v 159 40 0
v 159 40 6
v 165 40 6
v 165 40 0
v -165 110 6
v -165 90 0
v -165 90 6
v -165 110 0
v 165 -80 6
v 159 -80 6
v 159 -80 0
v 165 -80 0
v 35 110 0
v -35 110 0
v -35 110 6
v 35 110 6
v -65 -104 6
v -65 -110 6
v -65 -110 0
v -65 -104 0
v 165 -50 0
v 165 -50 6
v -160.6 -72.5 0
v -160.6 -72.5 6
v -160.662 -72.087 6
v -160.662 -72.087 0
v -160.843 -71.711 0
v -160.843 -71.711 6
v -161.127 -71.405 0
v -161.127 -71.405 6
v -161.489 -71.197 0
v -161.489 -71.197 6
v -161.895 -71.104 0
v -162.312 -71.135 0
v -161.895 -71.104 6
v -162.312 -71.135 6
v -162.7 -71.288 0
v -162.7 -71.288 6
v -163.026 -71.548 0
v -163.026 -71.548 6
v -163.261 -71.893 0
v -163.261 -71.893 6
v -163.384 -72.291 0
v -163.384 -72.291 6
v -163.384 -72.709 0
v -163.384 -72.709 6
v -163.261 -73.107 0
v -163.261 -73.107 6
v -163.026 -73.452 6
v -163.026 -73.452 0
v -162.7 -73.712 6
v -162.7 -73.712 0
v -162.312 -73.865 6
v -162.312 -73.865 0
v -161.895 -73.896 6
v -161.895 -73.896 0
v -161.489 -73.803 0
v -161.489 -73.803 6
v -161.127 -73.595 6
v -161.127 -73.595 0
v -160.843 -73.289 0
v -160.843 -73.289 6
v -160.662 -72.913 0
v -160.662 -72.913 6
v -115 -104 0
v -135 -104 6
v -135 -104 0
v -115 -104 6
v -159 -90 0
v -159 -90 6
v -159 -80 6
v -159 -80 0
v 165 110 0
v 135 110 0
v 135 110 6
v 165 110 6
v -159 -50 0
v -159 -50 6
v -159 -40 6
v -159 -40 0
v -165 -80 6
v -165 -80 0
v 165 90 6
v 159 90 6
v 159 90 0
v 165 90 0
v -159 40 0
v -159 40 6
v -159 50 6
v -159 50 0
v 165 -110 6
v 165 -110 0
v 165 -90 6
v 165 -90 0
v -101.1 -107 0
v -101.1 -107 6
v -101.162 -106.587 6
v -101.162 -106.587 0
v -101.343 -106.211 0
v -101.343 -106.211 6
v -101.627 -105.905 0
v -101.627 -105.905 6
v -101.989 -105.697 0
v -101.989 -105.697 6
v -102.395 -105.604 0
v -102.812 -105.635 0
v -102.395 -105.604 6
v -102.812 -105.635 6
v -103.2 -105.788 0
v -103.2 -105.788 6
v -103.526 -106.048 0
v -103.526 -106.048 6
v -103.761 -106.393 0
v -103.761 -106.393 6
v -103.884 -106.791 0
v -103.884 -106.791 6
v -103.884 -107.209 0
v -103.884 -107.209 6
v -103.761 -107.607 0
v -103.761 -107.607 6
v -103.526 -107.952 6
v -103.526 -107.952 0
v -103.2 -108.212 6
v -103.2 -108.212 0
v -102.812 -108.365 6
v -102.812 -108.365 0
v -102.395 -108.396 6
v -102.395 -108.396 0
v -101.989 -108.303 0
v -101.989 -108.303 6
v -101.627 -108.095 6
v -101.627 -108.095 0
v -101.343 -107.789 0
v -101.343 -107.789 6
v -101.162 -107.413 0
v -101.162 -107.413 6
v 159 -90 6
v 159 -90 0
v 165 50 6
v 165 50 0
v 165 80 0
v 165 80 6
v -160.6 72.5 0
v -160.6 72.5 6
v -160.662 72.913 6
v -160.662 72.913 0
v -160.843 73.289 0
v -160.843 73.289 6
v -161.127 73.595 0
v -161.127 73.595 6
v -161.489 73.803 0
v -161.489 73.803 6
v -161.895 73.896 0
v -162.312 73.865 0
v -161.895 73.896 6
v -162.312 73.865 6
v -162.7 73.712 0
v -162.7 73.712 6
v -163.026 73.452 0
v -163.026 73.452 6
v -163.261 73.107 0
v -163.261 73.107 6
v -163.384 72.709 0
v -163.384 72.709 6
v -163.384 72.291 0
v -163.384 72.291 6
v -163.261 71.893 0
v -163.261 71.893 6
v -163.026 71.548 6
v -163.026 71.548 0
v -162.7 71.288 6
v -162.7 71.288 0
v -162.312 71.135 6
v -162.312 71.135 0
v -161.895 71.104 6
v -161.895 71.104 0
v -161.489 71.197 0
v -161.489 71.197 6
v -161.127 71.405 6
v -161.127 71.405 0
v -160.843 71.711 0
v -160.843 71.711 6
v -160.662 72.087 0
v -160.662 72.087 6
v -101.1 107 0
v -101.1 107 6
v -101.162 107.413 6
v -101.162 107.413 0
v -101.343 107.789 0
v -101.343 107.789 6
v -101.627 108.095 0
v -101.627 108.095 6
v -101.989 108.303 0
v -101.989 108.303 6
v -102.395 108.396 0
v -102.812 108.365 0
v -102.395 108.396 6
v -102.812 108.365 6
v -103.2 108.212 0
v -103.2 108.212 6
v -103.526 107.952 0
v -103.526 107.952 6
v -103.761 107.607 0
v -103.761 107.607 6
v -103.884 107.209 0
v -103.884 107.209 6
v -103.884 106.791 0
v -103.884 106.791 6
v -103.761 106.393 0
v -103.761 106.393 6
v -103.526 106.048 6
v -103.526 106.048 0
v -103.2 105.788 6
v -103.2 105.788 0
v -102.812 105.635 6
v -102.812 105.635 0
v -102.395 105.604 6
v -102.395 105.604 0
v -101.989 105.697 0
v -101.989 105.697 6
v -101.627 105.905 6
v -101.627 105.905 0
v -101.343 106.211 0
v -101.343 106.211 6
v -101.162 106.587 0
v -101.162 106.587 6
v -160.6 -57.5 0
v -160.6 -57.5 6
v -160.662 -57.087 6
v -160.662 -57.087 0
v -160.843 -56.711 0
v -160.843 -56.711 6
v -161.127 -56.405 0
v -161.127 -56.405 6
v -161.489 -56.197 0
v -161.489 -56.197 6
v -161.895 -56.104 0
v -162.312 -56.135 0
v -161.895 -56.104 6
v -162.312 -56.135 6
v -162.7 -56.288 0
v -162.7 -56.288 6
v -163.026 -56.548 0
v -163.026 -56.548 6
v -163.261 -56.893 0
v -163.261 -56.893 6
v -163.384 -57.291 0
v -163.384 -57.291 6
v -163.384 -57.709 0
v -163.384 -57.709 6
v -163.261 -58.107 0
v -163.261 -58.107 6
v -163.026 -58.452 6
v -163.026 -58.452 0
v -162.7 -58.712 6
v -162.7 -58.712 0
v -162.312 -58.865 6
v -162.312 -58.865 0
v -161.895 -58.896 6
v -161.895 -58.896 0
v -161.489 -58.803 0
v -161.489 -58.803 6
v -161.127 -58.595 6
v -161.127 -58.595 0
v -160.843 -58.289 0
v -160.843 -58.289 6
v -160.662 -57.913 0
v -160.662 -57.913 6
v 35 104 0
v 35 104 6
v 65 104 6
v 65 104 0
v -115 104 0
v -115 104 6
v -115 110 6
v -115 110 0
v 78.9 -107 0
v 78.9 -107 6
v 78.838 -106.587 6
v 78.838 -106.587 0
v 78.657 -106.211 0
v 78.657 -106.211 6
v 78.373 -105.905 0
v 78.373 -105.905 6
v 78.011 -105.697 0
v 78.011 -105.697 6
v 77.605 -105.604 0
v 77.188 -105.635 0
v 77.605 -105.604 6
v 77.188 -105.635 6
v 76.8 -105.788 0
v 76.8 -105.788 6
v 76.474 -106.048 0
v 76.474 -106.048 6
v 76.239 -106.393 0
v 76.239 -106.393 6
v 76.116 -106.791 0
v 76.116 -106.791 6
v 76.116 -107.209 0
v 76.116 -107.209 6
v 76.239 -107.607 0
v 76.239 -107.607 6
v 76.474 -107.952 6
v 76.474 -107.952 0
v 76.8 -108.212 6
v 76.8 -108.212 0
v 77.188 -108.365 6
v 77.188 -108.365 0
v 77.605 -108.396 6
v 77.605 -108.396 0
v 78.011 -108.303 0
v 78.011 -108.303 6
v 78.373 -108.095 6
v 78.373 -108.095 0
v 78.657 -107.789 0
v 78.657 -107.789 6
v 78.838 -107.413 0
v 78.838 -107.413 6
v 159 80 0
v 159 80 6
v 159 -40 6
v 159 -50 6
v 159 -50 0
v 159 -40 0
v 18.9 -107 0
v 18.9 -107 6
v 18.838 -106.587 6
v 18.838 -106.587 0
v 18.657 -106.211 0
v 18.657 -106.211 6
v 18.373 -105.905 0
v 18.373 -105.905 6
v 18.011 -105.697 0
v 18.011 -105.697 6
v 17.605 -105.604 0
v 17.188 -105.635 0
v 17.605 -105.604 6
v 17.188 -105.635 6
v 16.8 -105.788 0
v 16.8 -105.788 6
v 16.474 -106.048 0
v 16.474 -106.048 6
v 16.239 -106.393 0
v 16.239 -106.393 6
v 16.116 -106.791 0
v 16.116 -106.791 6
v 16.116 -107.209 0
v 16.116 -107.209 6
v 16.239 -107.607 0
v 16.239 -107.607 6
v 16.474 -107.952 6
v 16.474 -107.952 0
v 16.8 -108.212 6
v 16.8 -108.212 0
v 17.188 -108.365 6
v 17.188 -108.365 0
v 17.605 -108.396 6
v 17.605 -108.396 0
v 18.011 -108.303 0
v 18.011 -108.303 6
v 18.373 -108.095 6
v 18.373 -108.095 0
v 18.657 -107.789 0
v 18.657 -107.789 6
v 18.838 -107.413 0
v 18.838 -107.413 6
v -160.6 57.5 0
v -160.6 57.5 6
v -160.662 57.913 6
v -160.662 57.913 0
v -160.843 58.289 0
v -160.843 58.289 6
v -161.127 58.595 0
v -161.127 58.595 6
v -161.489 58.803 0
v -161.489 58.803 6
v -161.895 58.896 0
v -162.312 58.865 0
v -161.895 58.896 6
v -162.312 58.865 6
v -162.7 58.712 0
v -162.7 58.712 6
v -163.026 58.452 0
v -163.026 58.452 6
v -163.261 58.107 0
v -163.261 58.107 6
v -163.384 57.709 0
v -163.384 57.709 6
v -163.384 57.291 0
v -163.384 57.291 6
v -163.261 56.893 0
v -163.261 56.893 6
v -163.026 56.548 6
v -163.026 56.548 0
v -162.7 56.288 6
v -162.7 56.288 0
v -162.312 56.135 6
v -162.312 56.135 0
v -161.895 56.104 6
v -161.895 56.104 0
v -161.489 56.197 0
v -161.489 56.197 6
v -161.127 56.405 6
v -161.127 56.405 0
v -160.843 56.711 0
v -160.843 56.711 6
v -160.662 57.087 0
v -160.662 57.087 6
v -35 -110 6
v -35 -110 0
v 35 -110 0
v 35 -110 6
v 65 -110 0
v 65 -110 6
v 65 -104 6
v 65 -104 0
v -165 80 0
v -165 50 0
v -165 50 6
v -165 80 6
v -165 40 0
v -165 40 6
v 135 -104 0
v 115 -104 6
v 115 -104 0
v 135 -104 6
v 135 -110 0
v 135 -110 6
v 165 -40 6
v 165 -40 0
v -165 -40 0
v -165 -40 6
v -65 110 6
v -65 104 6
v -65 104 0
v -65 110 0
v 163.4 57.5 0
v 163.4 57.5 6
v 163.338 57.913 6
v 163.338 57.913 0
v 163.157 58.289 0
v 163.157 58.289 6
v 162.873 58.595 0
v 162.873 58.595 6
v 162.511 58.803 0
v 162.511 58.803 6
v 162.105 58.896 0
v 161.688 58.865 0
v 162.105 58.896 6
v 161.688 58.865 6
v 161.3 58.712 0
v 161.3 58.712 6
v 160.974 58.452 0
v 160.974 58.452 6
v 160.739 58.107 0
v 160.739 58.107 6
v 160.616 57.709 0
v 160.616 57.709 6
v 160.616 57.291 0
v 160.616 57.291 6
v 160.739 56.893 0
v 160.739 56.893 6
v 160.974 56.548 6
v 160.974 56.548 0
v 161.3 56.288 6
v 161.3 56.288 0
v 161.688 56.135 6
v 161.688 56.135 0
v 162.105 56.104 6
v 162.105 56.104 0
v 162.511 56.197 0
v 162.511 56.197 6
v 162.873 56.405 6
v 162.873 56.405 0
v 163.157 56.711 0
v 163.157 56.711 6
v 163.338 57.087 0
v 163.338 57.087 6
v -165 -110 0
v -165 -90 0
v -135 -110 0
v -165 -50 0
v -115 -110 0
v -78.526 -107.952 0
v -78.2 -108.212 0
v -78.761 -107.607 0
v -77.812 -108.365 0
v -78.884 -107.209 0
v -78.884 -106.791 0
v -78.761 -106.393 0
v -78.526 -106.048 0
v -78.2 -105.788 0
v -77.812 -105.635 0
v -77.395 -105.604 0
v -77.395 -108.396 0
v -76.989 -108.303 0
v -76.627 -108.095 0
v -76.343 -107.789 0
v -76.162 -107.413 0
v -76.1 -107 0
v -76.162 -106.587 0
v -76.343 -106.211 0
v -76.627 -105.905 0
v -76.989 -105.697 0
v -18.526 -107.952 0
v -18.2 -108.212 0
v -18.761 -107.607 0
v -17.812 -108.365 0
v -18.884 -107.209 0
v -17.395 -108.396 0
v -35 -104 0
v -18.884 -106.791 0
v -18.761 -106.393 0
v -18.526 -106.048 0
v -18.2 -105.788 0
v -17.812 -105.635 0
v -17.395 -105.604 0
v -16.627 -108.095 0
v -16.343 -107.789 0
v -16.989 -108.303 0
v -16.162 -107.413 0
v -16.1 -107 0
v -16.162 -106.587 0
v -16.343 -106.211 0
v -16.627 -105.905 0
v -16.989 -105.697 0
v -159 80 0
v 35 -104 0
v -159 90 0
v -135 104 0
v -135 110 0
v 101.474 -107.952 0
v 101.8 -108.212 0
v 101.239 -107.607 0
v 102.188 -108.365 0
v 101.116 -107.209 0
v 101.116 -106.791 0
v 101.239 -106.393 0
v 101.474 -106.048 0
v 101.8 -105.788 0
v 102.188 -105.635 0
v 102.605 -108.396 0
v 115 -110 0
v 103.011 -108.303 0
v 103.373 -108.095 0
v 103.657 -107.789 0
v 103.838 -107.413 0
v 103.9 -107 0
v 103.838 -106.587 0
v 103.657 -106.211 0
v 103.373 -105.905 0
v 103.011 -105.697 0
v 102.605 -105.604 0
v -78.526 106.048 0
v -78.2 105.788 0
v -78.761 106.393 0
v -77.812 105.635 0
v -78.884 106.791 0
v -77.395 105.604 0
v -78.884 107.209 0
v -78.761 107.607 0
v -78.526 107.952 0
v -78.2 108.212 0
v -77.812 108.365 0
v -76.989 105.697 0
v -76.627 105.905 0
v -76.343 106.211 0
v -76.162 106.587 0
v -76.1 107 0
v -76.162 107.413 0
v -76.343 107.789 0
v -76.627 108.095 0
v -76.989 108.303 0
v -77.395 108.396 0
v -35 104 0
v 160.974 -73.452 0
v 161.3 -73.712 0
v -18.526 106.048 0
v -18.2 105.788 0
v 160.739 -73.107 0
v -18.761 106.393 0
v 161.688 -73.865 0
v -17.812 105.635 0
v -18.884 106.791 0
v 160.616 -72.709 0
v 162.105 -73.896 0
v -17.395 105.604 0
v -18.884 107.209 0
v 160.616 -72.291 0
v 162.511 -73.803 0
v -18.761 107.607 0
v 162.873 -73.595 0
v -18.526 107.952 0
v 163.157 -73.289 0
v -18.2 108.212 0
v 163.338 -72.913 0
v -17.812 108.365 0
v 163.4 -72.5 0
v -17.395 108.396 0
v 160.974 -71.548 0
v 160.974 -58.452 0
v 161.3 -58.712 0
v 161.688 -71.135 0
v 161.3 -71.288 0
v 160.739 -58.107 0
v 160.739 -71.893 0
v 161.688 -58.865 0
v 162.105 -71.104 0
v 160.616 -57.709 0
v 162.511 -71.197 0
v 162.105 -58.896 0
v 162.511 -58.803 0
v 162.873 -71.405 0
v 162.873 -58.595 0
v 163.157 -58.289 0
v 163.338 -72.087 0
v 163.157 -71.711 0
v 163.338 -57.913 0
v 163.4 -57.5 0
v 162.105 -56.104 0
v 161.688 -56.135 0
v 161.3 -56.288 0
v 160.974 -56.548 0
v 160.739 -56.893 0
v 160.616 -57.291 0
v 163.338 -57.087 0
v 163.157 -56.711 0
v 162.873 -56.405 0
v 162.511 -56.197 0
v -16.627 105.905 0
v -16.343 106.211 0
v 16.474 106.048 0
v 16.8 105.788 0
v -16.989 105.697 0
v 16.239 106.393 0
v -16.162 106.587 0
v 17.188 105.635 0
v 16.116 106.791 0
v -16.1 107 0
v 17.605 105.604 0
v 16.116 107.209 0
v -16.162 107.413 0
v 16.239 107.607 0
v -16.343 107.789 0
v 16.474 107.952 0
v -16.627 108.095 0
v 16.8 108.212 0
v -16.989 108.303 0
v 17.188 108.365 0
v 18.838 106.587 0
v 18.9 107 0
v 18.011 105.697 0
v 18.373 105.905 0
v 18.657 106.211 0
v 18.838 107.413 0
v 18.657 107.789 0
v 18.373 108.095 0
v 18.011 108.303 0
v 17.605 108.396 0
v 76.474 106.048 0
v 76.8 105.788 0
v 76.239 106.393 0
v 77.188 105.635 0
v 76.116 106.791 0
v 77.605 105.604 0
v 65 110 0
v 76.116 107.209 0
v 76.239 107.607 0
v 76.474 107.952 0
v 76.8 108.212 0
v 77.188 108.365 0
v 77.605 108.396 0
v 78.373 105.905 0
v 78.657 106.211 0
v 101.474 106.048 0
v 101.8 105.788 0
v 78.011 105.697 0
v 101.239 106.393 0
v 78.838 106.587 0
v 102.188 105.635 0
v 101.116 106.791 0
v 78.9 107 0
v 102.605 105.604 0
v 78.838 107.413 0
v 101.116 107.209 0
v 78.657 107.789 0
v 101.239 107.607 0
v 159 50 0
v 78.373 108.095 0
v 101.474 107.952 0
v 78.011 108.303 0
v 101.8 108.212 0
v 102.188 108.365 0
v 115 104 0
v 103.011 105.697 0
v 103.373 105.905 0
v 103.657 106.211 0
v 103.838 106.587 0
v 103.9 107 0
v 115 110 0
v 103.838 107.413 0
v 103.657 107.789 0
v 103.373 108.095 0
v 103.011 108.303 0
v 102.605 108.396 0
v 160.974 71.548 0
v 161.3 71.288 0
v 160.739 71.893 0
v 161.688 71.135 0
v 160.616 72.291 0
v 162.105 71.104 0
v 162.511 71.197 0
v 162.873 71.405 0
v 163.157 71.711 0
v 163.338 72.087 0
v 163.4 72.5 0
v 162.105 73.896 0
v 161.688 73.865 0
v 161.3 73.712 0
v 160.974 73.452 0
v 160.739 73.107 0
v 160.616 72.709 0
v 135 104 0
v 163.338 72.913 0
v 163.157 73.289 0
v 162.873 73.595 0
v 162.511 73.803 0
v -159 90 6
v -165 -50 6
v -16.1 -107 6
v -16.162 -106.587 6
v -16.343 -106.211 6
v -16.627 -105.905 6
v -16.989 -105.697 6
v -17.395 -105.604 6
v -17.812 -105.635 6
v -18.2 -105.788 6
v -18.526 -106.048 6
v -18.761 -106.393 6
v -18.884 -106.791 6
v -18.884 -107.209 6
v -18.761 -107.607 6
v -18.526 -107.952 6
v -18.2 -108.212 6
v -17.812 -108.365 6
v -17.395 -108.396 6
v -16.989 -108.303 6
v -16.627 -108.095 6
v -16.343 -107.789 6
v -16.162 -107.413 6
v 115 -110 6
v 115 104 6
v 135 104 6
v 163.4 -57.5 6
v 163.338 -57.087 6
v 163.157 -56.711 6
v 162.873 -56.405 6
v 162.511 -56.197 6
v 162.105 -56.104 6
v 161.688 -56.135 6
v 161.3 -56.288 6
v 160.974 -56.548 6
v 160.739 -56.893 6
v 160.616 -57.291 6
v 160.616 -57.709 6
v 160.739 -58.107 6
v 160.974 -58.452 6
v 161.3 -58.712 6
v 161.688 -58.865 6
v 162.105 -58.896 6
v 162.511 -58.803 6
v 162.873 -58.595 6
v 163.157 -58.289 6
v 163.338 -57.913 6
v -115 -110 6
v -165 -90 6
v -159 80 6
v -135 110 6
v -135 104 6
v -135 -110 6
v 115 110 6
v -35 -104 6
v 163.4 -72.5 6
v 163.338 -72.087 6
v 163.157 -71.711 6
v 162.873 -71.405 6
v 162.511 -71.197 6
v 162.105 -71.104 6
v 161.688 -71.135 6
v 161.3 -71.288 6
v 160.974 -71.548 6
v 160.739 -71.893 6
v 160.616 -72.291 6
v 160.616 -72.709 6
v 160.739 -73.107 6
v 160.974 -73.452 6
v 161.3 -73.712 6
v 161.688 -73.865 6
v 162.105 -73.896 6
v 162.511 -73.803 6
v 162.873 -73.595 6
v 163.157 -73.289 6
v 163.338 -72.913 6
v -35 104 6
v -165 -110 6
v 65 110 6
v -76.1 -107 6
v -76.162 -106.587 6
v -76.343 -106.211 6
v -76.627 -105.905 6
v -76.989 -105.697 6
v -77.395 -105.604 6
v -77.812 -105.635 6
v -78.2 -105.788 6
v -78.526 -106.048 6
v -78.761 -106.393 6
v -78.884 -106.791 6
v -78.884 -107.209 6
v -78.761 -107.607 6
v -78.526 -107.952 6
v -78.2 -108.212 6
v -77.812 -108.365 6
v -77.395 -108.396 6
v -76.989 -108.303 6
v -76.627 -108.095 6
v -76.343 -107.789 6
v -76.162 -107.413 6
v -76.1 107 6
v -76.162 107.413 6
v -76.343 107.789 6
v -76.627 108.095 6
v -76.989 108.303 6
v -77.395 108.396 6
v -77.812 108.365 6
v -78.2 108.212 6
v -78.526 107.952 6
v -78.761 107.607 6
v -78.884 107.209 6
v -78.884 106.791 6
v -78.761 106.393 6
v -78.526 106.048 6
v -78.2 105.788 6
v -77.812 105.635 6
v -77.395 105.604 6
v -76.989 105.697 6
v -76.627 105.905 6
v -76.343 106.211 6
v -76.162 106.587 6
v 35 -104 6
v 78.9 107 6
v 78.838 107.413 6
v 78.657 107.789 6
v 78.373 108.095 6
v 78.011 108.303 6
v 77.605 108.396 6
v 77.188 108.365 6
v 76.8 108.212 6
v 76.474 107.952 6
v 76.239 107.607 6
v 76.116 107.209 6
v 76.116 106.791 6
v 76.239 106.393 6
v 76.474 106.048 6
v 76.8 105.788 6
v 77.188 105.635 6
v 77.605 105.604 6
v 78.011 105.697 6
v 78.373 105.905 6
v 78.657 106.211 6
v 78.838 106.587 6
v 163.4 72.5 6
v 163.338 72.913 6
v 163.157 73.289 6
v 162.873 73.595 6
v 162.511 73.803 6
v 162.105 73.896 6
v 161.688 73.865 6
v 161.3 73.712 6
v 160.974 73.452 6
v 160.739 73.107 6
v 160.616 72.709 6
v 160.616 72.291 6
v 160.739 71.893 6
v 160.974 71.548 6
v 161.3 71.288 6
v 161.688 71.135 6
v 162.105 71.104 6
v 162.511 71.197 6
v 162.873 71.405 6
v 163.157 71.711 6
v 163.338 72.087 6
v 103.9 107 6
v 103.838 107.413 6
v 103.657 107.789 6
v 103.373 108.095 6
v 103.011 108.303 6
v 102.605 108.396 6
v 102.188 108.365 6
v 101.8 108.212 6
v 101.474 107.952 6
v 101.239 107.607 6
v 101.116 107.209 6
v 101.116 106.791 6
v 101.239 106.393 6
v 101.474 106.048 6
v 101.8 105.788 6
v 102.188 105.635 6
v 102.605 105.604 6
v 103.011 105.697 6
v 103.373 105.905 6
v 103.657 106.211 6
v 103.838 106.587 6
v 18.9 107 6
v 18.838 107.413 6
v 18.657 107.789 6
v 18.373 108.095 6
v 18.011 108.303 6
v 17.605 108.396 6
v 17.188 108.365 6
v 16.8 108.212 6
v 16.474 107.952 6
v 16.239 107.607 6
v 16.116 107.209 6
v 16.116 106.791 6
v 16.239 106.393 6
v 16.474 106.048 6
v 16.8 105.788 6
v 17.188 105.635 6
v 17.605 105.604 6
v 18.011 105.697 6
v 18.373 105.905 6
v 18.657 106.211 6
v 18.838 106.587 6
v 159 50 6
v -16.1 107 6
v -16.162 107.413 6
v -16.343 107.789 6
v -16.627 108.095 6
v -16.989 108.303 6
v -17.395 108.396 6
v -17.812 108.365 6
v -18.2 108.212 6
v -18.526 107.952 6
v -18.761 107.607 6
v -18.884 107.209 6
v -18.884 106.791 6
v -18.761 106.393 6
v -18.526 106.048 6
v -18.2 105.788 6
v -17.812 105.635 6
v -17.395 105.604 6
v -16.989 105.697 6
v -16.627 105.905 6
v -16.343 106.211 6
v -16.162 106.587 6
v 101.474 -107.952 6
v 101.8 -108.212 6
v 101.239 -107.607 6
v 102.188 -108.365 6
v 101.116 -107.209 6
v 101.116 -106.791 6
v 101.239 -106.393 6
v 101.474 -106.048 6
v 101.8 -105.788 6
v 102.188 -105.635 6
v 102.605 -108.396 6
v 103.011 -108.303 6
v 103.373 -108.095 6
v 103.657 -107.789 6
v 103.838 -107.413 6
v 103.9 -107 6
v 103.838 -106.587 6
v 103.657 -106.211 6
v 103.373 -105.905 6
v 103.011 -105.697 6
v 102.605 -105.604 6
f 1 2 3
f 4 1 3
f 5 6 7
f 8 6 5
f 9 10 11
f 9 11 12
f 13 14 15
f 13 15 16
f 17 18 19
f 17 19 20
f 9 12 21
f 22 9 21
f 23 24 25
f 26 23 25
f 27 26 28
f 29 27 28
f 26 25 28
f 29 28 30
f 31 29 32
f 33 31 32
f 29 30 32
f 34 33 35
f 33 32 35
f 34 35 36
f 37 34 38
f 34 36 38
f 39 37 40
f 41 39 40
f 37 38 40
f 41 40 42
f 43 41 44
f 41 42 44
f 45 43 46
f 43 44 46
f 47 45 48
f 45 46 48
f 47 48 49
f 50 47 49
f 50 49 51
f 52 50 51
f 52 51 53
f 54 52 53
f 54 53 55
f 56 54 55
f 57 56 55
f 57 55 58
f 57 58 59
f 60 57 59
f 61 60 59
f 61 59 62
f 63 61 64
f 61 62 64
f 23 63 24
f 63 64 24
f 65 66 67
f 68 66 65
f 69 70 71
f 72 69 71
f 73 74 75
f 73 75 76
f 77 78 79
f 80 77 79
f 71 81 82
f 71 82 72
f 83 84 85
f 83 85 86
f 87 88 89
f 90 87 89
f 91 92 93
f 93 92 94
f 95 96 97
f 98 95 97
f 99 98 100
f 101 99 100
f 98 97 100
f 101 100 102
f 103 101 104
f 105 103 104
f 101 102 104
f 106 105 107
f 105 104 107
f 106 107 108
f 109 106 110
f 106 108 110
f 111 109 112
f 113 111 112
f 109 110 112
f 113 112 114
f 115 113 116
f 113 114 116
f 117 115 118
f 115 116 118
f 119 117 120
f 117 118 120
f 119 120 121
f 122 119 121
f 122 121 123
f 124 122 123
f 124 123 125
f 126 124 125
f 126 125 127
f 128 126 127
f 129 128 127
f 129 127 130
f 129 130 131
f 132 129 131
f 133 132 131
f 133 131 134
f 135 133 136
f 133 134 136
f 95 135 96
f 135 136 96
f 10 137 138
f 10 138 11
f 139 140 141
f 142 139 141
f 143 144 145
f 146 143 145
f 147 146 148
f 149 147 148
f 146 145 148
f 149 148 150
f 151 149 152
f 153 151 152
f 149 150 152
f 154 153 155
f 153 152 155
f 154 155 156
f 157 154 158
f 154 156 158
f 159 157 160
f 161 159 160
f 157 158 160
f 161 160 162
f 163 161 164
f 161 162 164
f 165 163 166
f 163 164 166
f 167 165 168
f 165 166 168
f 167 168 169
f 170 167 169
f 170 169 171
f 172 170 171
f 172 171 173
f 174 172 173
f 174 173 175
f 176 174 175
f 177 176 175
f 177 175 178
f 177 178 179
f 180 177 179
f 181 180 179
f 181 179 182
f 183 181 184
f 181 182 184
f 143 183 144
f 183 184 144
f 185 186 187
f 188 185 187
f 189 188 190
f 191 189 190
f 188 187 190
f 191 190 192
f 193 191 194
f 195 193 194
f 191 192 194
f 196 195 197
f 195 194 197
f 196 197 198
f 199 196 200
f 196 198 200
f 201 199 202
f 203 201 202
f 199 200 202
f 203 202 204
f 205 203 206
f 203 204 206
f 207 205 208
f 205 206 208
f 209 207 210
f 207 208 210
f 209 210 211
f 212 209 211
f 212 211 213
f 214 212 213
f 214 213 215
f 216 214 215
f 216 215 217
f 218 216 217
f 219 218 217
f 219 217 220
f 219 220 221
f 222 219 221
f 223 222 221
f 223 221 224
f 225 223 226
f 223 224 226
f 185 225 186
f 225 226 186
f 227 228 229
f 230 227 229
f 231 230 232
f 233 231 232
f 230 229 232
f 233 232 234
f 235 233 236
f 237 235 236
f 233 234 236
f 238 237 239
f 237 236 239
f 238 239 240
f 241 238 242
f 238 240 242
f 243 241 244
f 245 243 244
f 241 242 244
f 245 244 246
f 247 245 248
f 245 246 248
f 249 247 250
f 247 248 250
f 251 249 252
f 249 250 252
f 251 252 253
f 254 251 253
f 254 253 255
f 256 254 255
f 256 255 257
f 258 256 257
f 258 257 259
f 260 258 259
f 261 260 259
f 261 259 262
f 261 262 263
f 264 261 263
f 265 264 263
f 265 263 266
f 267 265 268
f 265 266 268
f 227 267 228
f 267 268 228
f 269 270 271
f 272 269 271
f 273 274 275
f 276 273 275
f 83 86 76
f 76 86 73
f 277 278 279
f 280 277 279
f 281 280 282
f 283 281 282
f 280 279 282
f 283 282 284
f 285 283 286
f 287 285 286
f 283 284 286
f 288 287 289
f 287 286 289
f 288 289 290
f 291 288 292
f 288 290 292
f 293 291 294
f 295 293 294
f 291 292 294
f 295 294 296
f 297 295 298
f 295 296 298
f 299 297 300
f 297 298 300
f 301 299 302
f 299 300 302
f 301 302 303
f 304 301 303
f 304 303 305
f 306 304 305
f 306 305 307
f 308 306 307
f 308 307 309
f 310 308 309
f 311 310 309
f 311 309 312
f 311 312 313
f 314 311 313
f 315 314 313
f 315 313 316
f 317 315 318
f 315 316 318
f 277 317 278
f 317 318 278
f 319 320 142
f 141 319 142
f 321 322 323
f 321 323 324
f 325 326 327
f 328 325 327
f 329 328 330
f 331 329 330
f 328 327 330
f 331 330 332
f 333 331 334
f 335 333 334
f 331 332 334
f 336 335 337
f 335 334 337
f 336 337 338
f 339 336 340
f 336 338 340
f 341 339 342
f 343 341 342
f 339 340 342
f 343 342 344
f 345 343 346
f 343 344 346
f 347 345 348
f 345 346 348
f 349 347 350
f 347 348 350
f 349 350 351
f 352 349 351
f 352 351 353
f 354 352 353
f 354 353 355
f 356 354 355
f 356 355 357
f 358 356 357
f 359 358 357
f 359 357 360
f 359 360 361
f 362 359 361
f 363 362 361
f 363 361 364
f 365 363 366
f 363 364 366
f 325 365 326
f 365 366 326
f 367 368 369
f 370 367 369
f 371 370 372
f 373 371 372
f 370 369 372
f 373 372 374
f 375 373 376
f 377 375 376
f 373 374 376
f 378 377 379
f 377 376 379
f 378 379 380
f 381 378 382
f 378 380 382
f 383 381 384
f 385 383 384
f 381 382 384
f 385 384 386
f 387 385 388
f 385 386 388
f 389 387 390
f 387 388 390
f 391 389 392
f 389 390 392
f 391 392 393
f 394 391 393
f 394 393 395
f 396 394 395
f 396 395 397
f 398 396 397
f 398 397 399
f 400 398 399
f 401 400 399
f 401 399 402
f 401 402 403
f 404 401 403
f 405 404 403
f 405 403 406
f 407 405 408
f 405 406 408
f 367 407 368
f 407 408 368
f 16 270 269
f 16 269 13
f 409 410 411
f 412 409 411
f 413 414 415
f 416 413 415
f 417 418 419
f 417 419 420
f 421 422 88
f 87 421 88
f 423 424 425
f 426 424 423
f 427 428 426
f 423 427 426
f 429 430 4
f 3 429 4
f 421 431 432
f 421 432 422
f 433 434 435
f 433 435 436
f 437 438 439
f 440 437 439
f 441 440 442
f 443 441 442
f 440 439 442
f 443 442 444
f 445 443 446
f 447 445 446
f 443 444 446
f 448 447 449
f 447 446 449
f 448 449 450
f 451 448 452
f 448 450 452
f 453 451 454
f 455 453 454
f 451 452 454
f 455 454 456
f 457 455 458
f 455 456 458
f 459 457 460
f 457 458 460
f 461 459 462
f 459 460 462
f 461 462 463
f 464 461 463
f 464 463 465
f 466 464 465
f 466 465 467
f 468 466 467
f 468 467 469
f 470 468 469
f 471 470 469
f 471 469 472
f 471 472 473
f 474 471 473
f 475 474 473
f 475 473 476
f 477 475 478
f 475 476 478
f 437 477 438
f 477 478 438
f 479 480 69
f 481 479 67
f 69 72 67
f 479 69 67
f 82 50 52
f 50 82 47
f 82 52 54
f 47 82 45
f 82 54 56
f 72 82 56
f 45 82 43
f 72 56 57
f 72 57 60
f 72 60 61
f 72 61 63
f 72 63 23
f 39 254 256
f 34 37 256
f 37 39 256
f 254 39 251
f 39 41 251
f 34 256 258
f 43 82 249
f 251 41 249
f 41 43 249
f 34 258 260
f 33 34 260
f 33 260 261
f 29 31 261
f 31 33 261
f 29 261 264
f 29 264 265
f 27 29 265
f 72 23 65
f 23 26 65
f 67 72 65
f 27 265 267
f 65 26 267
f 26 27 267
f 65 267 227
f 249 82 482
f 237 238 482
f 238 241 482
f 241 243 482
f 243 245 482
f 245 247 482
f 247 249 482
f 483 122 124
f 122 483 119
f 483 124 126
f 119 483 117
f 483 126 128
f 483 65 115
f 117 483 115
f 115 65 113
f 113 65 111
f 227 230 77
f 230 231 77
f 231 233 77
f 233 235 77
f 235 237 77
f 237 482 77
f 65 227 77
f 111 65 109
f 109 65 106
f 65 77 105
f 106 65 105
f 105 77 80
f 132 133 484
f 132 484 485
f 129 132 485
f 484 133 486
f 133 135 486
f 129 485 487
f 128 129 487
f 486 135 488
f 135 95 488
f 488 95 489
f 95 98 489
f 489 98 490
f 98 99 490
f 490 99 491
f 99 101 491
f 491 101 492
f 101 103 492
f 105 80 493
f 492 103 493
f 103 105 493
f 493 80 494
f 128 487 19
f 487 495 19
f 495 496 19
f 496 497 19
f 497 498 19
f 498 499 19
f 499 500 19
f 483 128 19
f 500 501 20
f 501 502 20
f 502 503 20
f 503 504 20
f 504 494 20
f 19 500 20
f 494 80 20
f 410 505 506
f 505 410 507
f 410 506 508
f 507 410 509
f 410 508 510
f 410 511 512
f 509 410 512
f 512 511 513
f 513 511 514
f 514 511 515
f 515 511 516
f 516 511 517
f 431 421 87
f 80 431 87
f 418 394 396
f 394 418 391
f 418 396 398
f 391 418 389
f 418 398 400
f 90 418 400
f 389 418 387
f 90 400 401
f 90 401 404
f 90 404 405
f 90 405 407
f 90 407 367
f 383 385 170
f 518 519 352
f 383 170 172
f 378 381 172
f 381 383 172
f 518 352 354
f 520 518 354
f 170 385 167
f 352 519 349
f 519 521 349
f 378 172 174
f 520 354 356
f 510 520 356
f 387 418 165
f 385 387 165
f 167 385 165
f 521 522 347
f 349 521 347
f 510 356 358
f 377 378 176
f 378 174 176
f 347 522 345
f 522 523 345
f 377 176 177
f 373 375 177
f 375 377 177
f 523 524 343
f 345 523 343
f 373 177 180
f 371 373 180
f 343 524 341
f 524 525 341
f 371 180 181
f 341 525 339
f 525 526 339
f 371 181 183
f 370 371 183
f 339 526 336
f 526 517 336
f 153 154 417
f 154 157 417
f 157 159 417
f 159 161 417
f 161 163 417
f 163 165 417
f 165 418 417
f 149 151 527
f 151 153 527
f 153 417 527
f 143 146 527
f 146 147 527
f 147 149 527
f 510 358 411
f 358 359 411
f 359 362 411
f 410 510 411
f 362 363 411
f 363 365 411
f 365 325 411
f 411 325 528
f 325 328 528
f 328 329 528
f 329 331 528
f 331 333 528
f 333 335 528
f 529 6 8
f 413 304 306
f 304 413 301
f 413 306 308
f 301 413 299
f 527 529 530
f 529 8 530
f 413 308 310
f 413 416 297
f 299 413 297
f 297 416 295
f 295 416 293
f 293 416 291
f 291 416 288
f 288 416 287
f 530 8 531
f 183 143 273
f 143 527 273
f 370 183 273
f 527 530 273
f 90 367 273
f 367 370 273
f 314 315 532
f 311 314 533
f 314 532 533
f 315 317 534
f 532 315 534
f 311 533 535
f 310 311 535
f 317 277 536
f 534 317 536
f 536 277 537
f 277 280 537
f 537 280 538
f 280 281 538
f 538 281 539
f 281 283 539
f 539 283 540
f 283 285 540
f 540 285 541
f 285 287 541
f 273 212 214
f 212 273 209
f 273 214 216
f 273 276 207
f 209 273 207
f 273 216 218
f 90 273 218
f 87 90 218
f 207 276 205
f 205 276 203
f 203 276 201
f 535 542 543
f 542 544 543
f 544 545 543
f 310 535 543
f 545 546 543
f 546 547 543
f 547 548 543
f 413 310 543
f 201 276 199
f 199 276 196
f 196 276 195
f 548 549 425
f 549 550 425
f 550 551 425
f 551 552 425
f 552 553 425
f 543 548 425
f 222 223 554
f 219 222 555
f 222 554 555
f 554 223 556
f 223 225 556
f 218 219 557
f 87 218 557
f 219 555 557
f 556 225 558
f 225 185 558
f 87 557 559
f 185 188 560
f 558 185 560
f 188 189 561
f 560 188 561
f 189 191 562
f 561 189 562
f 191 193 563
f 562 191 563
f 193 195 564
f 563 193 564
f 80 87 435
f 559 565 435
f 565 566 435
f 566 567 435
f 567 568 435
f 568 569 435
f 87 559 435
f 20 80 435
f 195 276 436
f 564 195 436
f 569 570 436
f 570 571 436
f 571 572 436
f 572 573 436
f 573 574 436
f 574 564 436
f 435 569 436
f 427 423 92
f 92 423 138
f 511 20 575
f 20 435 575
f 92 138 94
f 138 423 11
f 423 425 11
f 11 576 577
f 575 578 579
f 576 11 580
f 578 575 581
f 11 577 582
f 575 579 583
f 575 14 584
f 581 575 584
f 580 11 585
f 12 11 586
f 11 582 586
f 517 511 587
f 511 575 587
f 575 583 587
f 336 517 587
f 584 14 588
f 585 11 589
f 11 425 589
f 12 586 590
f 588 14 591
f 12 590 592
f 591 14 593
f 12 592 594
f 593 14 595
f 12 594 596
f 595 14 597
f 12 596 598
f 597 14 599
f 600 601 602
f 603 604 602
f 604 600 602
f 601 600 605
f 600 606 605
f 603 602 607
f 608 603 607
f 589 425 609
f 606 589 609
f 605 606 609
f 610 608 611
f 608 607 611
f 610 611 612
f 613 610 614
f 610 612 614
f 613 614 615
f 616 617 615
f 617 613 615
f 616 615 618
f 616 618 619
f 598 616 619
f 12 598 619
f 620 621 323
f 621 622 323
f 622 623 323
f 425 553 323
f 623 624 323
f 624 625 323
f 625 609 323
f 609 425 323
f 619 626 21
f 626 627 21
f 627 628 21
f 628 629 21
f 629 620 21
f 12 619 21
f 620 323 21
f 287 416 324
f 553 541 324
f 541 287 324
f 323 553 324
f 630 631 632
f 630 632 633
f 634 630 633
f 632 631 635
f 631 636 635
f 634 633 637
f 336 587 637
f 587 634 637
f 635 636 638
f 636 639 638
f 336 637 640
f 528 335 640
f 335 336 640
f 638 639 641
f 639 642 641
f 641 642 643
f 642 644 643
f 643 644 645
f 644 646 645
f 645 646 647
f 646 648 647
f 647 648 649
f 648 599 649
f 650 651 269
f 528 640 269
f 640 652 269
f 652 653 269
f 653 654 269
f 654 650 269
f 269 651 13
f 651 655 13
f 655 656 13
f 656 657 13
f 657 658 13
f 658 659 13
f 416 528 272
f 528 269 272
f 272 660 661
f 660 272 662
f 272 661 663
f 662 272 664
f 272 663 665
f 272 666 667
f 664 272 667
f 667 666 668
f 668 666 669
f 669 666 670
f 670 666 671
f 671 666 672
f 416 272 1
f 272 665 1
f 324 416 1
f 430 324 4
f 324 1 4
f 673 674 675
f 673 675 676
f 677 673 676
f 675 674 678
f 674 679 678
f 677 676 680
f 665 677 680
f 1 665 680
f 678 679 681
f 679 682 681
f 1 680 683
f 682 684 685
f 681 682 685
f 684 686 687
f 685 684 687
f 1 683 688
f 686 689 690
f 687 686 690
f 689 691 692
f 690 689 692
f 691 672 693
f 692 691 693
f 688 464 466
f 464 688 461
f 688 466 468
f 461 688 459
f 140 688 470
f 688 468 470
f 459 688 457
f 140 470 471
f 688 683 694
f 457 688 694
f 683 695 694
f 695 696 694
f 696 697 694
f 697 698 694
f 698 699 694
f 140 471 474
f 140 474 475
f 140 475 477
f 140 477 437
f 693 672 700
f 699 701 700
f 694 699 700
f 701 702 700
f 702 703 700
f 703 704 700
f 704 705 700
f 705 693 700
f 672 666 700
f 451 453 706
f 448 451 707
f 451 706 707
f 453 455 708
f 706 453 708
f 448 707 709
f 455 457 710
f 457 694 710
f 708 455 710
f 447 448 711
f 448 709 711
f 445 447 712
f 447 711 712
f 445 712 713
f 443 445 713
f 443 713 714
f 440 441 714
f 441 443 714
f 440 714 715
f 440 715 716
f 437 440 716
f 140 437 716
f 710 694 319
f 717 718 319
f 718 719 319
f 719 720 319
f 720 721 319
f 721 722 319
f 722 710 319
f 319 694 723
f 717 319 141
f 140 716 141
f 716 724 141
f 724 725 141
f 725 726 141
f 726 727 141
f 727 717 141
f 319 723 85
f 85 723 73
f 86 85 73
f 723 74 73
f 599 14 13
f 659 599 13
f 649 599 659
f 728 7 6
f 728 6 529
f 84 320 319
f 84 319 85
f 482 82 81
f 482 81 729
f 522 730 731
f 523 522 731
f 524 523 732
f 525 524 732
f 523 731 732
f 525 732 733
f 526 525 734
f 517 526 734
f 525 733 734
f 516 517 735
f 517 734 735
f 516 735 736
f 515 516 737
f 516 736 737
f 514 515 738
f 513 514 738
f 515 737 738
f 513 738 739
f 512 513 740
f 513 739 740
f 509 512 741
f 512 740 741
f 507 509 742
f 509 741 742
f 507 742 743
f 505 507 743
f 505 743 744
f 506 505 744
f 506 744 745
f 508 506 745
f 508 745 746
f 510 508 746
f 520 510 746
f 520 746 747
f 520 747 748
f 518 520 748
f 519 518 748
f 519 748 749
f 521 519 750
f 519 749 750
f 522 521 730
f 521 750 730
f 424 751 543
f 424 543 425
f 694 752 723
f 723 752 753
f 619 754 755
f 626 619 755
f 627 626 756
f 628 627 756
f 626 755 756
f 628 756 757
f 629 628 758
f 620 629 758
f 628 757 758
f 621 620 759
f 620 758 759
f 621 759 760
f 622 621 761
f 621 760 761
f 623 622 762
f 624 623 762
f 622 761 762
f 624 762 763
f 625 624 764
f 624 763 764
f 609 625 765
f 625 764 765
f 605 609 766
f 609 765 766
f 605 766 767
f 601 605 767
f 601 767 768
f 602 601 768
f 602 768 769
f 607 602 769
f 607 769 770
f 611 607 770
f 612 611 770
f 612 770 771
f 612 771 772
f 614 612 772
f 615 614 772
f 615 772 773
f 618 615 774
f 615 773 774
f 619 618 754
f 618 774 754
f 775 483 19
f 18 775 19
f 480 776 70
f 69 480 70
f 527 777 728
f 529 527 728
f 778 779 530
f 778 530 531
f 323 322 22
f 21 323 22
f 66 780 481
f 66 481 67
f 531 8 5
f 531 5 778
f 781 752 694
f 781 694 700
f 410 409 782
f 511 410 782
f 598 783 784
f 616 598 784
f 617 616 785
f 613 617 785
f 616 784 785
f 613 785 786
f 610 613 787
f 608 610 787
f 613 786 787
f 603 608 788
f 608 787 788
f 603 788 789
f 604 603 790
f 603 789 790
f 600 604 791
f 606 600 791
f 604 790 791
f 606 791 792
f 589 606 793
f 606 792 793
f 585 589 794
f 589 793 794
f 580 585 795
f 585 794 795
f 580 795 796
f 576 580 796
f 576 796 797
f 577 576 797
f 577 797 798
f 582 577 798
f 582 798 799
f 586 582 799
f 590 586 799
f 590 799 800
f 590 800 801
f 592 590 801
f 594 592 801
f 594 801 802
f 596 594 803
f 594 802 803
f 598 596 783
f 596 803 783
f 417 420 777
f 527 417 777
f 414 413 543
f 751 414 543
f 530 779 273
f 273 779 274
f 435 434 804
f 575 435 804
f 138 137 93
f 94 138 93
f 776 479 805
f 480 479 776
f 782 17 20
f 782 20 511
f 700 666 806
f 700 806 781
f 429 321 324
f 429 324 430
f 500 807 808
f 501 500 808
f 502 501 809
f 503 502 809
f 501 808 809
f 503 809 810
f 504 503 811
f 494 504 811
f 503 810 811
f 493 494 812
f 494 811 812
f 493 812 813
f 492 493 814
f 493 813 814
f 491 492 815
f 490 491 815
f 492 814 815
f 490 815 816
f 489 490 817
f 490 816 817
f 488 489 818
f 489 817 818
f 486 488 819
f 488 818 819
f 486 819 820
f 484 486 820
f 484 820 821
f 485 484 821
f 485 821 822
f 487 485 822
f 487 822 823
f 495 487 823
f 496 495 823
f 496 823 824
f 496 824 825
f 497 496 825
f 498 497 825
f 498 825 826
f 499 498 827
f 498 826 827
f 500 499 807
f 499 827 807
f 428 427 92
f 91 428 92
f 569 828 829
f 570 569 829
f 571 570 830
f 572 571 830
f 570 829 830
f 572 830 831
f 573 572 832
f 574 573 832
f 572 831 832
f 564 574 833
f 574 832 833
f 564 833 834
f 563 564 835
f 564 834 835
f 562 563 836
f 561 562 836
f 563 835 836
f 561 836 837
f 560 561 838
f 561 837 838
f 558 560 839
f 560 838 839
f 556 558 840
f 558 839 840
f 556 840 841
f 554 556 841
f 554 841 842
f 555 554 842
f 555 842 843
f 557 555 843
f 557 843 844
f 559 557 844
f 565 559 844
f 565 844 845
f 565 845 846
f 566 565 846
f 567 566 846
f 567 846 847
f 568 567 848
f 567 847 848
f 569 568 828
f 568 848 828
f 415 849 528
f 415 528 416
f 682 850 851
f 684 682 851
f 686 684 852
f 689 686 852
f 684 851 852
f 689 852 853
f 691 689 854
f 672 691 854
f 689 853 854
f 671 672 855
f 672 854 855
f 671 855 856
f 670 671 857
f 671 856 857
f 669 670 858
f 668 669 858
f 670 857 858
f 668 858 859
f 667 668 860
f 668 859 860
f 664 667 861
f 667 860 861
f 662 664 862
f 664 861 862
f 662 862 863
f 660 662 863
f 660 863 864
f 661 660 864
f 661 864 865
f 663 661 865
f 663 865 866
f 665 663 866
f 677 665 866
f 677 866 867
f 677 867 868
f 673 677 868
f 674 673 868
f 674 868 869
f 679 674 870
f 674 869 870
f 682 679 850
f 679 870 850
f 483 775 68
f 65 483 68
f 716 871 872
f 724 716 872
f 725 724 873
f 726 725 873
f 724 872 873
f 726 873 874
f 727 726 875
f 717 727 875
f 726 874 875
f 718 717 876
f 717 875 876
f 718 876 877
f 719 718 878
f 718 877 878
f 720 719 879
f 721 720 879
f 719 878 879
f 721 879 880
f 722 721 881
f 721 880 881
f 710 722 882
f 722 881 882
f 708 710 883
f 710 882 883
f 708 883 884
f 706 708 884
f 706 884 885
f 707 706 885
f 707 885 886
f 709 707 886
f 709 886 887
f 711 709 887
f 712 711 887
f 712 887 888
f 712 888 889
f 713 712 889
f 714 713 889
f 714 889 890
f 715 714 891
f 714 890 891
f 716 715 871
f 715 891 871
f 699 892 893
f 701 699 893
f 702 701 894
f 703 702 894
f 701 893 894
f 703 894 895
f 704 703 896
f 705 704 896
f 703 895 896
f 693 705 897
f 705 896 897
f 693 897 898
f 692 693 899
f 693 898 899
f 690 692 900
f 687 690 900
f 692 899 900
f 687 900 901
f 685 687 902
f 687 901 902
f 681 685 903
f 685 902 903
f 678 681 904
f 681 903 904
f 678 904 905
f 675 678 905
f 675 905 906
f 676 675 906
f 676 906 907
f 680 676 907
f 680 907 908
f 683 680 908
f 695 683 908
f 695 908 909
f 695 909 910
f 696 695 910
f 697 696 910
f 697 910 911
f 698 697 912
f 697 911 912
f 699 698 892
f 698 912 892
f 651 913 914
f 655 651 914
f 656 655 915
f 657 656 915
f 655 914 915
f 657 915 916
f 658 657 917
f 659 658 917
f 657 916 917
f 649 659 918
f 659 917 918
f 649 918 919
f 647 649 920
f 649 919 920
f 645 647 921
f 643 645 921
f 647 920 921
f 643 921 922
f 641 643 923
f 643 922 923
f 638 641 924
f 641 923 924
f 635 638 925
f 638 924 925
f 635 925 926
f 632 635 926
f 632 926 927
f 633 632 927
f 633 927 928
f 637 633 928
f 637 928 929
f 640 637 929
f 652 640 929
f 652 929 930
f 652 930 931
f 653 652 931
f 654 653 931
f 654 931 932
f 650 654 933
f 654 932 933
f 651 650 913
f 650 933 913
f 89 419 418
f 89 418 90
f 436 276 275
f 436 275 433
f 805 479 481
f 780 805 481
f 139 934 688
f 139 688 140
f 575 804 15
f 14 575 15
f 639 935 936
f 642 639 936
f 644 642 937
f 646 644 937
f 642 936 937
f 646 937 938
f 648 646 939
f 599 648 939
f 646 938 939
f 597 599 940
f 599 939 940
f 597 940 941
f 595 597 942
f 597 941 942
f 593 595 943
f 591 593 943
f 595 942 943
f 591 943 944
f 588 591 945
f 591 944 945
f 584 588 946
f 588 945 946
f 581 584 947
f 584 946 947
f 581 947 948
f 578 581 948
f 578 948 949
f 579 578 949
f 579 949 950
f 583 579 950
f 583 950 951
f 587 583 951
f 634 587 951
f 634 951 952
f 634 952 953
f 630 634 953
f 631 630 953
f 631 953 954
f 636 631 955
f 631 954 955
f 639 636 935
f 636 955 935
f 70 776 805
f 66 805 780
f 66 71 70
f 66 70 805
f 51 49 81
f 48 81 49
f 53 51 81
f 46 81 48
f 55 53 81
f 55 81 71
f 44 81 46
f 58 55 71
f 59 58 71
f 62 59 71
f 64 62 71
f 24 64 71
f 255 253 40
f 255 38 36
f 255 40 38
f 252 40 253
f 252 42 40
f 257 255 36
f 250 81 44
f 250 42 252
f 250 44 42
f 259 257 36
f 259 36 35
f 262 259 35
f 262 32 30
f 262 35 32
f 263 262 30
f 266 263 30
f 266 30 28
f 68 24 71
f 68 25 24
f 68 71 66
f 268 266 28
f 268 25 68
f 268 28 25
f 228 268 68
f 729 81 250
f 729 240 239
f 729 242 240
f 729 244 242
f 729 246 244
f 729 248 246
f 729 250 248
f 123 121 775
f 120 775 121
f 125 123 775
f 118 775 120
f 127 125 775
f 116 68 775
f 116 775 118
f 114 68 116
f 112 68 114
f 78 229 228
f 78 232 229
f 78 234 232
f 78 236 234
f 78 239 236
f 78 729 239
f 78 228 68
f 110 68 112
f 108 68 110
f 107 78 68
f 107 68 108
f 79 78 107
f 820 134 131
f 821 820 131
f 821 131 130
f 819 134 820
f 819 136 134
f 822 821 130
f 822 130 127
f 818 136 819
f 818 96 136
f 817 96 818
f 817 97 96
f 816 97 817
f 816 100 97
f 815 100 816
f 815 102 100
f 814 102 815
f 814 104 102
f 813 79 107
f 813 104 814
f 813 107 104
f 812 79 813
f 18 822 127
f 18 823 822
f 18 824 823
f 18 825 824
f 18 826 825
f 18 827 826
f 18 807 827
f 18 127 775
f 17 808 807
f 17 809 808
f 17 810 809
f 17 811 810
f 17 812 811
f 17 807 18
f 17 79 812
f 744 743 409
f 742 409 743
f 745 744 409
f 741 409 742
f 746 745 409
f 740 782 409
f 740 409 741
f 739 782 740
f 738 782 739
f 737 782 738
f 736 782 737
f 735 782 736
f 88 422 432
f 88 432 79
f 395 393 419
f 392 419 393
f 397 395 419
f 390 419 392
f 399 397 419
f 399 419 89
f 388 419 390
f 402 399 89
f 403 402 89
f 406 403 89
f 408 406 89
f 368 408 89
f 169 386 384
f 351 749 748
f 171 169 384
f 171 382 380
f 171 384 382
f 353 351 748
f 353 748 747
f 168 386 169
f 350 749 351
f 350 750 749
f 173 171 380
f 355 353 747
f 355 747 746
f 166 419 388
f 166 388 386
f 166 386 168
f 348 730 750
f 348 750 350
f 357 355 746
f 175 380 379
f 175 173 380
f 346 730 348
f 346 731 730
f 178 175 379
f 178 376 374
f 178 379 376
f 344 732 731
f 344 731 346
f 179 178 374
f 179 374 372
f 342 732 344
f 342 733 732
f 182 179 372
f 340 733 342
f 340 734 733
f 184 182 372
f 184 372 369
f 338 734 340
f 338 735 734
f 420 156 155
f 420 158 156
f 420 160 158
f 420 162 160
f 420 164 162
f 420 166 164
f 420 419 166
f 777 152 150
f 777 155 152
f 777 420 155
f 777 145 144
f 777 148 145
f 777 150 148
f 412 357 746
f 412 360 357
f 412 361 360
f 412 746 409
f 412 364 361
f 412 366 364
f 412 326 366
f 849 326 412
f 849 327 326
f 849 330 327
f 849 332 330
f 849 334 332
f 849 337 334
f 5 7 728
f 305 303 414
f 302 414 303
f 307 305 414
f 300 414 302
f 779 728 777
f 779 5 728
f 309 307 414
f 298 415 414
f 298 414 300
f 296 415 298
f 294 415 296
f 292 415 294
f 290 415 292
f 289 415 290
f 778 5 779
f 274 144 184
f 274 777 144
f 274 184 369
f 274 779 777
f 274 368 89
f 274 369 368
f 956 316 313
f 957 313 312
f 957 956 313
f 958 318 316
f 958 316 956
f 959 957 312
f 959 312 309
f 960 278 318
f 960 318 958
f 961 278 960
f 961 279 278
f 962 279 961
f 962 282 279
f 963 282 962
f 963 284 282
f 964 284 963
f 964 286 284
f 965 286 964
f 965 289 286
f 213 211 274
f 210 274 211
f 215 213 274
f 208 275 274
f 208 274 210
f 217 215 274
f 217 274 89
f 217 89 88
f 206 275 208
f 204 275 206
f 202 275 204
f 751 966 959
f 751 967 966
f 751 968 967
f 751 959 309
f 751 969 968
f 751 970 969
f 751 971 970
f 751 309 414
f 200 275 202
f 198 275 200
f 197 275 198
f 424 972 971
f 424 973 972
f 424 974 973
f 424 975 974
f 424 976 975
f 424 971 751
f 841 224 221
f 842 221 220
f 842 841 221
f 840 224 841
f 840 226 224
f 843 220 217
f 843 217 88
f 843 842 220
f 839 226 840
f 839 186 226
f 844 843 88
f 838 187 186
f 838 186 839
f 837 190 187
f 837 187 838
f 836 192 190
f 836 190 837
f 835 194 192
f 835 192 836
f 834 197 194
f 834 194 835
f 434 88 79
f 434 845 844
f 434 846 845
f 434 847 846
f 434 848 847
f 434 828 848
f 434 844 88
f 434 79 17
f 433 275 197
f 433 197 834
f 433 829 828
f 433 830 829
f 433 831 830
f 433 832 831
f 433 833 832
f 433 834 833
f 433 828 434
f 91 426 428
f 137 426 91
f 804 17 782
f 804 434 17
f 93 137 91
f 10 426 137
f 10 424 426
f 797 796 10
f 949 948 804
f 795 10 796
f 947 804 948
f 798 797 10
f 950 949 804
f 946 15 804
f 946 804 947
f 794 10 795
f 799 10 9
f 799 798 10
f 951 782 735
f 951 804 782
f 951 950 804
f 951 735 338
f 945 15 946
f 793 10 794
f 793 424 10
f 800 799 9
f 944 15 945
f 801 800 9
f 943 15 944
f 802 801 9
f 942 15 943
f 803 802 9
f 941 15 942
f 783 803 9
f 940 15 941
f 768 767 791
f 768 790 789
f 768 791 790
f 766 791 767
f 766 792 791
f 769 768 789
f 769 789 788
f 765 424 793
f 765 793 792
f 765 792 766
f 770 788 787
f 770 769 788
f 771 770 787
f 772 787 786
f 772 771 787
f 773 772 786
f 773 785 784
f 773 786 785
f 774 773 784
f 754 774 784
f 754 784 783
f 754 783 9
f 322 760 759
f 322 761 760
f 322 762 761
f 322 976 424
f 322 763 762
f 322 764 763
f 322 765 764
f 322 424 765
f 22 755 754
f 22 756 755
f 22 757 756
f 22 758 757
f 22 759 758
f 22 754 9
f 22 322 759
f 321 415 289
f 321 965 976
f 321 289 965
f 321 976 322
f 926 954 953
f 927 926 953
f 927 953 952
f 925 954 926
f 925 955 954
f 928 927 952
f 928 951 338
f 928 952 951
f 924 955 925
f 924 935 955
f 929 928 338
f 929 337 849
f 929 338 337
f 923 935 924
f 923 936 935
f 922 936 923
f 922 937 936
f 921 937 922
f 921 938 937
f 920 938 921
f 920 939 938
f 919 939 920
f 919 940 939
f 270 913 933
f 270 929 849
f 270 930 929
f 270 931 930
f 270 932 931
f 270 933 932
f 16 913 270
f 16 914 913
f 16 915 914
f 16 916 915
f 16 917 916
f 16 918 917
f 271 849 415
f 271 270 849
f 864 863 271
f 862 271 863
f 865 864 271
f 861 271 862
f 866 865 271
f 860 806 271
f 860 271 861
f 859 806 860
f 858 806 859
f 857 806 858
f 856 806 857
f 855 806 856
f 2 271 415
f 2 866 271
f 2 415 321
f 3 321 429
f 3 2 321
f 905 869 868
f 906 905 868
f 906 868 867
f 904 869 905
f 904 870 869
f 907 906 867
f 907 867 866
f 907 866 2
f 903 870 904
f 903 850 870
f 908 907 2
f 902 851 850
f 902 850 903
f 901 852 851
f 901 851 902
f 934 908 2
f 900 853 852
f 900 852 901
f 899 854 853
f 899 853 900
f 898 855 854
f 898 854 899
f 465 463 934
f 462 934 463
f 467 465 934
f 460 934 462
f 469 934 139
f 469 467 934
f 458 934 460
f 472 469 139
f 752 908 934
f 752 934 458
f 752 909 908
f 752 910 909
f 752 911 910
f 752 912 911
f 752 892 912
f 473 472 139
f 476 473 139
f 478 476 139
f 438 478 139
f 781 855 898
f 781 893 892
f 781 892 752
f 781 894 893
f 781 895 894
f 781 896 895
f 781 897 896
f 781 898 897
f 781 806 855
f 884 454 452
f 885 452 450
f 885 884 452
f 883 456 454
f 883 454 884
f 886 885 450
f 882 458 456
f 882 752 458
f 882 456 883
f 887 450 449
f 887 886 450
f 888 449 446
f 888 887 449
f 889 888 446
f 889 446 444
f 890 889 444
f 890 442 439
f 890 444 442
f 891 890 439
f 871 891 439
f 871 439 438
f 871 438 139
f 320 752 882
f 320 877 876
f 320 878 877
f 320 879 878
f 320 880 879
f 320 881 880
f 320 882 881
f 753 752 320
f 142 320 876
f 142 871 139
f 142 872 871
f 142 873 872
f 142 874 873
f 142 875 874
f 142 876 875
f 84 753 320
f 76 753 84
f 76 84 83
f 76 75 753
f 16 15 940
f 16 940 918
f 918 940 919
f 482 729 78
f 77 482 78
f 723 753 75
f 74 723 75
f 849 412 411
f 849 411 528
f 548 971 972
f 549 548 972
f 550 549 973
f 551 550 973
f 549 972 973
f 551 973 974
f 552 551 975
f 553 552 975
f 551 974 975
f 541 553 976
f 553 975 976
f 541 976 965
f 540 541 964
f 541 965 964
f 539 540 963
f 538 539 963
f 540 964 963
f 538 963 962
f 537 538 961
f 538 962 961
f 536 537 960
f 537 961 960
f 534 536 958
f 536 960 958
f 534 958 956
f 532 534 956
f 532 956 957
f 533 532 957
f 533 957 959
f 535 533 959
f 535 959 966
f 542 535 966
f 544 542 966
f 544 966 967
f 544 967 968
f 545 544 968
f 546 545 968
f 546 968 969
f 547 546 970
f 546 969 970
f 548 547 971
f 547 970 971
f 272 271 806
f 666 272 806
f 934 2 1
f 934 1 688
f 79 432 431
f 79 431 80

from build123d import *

# Parameters (mm, degrees)
ESQUISSE1_W             = 330
ESQUISSE1_H             = 220
BOSS_EXTRU_1_DEPTH      = 6
ESQUISSE3_W             = 20
ESQUISSE3_H             = 6
ESQUISSE3_W_2           = 30
ESQUISSE3_W_3           = 6
ESQUISSE3_H_2           = 10
ENL_V_MAT_EXTRU_2_DEPTH = 6
ESQUISSE4_R             = 1.4
ENL_V_MAT_EXTRU_3_DEPTH = 6


with BuildPart() as part:
    # Esquisse1 → Boss.-Extru.1 (new body)
    with BuildSketch(Plane.XY):
        Rectangle(ESQUISSE1_W, ESQUISSE1_H)
    extrude(amount=BOSS_EXTRU_1_DEPTH)

    # Esquisse3 → Enlèv. mat.-Extru.2 (cut)
    with BuildSketch(Plane.XY.offset(6)):
        with Locations((-125, 107)):
            Rectangle(ESQUISSE3_W, ESQUISSE3_H)
        with Locations((-50, 107)):
            Rectangle(ESQUISSE3_W_2, ESQUISSE3_H)
        with Locations((-162, 45)):
            Rectangle(ESQUISSE3_W_3, ESQUISSE3_H_2)
        with Locations((50, 107)):
            Rectangle(ESQUISSE3_W_2, ESQUISSE3_H)
        with Locations((-162, 85)):
            Rectangle(ESQUISSE3_W_3, ESQUISSE3_H_2)
        with Locations((162, 85)):
            Rectangle(ESQUISSE3_W_3, ESQUISSE3_H_2)
        with Locations((162, 45)):
            Rectangle(ESQUISSE3_W_3, ESQUISSE3_H_2)
        with Locations((125, 107)):
            Rectangle(ESQUISSE3_W, ESQUISSE3_H)
        with Locations((125, -107)):
            Rectangle(ESQUISSE3_W, ESQUISSE3_H)
        with Locations((50, -107)):
            Rectangle(ESQUISSE3_W_2, ESQUISSE3_H)
        with Locations((162, -45)):
            Rectangle(ESQUISSE3_W_3, ESQUISSE3_H_2)
        with Locations((162, -85)):
            Rectangle(ESQUISSE3_W_3, ESQUISSE3_H_2)
        with Locations((-162, -85)):
            Rectangle(ESQUISSE3_W_3, ESQUISSE3_H_2)
        with Locations((-162, -45)):
            Rectangle(ESQUISSE3_W_3, ESQUISSE3_H_2)
        with Locations((-50, -107)):
            Rectangle(ESQUISSE3_W_2, ESQUISSE3_H)
        with Locations((-125, -107)):
            Rectangle(ESQUISSE3_W, ESQUISSE3_H)
    extrude(amount=-ENL_V_MAT_EXTRU_2_DEPTH, mode=Mode.SUBTRACT)

    # Esquisse4 → Enlèv. mat.-Extru.3 (cut)
    with BuildSketch(Plane.XY.offset(6)):
        with Locations((-102.5, 107)):
            Circle(ESQUISSE4_R)
        with Locations((-77.5, 107)):
            Circle(ESQUISSE4_R)
        with Locations((-17.5, 107)):
            Circle(ESQUISSE4_R)
        with Locations((-162, 72.5)):
            Circle(ESQUISSE4_R)
        with Locations((-162, 57.5)):
            Circle(ESQUISSE4_R)
        with Locations((162, 57.5)):
            Circle(ESQUISSE4_R)
        with Locations((162, 72.5)):
            Circle(ESQUISSE4_R)
        with Locations((17.5, 107)):
            Circle(ESQUISSE4_R)
        with Locations((77.5, 107)):
            Circle(ESQUISSE4_R)
        with Locations((102.5, 107)):
            Circle(ESQUISSE4_R)
        with Locations((102.5, -107)):
            Circle(ESQUISSE4_R)
        with Locations((77.5, -107)):
            Circle(ESQUISSE4_R)
        with Locations((17.5, -107)):
            Circle(ESQUISSE4_R)
        with Locations((162, -72.5)):
            Circle(ESQUISSE4_R)
        with Locations((162, -57.5)):
            Circle(ESQUISSE4_R)
        with Locations((-162, -57.5)):
            Circle(ESQUISSE4_R)
        with Locations((-162, -72.5)):
            Circle(ESQUISSE4_R)
        with Locations((-17.5, -107)):
            Circle(ESQUISSE4_R)
        with Locations((-77.5, -107)):
            Circle(ESQUISSE4_R)
        with Locations((-102.5, -107)):
            Circle(ESQUISSE4_R)
    extrude(amount=-ENL_V_MAT_EXTRU_3_DEPTH, mode=Mode.SUBTRACT)


solid = part.part
